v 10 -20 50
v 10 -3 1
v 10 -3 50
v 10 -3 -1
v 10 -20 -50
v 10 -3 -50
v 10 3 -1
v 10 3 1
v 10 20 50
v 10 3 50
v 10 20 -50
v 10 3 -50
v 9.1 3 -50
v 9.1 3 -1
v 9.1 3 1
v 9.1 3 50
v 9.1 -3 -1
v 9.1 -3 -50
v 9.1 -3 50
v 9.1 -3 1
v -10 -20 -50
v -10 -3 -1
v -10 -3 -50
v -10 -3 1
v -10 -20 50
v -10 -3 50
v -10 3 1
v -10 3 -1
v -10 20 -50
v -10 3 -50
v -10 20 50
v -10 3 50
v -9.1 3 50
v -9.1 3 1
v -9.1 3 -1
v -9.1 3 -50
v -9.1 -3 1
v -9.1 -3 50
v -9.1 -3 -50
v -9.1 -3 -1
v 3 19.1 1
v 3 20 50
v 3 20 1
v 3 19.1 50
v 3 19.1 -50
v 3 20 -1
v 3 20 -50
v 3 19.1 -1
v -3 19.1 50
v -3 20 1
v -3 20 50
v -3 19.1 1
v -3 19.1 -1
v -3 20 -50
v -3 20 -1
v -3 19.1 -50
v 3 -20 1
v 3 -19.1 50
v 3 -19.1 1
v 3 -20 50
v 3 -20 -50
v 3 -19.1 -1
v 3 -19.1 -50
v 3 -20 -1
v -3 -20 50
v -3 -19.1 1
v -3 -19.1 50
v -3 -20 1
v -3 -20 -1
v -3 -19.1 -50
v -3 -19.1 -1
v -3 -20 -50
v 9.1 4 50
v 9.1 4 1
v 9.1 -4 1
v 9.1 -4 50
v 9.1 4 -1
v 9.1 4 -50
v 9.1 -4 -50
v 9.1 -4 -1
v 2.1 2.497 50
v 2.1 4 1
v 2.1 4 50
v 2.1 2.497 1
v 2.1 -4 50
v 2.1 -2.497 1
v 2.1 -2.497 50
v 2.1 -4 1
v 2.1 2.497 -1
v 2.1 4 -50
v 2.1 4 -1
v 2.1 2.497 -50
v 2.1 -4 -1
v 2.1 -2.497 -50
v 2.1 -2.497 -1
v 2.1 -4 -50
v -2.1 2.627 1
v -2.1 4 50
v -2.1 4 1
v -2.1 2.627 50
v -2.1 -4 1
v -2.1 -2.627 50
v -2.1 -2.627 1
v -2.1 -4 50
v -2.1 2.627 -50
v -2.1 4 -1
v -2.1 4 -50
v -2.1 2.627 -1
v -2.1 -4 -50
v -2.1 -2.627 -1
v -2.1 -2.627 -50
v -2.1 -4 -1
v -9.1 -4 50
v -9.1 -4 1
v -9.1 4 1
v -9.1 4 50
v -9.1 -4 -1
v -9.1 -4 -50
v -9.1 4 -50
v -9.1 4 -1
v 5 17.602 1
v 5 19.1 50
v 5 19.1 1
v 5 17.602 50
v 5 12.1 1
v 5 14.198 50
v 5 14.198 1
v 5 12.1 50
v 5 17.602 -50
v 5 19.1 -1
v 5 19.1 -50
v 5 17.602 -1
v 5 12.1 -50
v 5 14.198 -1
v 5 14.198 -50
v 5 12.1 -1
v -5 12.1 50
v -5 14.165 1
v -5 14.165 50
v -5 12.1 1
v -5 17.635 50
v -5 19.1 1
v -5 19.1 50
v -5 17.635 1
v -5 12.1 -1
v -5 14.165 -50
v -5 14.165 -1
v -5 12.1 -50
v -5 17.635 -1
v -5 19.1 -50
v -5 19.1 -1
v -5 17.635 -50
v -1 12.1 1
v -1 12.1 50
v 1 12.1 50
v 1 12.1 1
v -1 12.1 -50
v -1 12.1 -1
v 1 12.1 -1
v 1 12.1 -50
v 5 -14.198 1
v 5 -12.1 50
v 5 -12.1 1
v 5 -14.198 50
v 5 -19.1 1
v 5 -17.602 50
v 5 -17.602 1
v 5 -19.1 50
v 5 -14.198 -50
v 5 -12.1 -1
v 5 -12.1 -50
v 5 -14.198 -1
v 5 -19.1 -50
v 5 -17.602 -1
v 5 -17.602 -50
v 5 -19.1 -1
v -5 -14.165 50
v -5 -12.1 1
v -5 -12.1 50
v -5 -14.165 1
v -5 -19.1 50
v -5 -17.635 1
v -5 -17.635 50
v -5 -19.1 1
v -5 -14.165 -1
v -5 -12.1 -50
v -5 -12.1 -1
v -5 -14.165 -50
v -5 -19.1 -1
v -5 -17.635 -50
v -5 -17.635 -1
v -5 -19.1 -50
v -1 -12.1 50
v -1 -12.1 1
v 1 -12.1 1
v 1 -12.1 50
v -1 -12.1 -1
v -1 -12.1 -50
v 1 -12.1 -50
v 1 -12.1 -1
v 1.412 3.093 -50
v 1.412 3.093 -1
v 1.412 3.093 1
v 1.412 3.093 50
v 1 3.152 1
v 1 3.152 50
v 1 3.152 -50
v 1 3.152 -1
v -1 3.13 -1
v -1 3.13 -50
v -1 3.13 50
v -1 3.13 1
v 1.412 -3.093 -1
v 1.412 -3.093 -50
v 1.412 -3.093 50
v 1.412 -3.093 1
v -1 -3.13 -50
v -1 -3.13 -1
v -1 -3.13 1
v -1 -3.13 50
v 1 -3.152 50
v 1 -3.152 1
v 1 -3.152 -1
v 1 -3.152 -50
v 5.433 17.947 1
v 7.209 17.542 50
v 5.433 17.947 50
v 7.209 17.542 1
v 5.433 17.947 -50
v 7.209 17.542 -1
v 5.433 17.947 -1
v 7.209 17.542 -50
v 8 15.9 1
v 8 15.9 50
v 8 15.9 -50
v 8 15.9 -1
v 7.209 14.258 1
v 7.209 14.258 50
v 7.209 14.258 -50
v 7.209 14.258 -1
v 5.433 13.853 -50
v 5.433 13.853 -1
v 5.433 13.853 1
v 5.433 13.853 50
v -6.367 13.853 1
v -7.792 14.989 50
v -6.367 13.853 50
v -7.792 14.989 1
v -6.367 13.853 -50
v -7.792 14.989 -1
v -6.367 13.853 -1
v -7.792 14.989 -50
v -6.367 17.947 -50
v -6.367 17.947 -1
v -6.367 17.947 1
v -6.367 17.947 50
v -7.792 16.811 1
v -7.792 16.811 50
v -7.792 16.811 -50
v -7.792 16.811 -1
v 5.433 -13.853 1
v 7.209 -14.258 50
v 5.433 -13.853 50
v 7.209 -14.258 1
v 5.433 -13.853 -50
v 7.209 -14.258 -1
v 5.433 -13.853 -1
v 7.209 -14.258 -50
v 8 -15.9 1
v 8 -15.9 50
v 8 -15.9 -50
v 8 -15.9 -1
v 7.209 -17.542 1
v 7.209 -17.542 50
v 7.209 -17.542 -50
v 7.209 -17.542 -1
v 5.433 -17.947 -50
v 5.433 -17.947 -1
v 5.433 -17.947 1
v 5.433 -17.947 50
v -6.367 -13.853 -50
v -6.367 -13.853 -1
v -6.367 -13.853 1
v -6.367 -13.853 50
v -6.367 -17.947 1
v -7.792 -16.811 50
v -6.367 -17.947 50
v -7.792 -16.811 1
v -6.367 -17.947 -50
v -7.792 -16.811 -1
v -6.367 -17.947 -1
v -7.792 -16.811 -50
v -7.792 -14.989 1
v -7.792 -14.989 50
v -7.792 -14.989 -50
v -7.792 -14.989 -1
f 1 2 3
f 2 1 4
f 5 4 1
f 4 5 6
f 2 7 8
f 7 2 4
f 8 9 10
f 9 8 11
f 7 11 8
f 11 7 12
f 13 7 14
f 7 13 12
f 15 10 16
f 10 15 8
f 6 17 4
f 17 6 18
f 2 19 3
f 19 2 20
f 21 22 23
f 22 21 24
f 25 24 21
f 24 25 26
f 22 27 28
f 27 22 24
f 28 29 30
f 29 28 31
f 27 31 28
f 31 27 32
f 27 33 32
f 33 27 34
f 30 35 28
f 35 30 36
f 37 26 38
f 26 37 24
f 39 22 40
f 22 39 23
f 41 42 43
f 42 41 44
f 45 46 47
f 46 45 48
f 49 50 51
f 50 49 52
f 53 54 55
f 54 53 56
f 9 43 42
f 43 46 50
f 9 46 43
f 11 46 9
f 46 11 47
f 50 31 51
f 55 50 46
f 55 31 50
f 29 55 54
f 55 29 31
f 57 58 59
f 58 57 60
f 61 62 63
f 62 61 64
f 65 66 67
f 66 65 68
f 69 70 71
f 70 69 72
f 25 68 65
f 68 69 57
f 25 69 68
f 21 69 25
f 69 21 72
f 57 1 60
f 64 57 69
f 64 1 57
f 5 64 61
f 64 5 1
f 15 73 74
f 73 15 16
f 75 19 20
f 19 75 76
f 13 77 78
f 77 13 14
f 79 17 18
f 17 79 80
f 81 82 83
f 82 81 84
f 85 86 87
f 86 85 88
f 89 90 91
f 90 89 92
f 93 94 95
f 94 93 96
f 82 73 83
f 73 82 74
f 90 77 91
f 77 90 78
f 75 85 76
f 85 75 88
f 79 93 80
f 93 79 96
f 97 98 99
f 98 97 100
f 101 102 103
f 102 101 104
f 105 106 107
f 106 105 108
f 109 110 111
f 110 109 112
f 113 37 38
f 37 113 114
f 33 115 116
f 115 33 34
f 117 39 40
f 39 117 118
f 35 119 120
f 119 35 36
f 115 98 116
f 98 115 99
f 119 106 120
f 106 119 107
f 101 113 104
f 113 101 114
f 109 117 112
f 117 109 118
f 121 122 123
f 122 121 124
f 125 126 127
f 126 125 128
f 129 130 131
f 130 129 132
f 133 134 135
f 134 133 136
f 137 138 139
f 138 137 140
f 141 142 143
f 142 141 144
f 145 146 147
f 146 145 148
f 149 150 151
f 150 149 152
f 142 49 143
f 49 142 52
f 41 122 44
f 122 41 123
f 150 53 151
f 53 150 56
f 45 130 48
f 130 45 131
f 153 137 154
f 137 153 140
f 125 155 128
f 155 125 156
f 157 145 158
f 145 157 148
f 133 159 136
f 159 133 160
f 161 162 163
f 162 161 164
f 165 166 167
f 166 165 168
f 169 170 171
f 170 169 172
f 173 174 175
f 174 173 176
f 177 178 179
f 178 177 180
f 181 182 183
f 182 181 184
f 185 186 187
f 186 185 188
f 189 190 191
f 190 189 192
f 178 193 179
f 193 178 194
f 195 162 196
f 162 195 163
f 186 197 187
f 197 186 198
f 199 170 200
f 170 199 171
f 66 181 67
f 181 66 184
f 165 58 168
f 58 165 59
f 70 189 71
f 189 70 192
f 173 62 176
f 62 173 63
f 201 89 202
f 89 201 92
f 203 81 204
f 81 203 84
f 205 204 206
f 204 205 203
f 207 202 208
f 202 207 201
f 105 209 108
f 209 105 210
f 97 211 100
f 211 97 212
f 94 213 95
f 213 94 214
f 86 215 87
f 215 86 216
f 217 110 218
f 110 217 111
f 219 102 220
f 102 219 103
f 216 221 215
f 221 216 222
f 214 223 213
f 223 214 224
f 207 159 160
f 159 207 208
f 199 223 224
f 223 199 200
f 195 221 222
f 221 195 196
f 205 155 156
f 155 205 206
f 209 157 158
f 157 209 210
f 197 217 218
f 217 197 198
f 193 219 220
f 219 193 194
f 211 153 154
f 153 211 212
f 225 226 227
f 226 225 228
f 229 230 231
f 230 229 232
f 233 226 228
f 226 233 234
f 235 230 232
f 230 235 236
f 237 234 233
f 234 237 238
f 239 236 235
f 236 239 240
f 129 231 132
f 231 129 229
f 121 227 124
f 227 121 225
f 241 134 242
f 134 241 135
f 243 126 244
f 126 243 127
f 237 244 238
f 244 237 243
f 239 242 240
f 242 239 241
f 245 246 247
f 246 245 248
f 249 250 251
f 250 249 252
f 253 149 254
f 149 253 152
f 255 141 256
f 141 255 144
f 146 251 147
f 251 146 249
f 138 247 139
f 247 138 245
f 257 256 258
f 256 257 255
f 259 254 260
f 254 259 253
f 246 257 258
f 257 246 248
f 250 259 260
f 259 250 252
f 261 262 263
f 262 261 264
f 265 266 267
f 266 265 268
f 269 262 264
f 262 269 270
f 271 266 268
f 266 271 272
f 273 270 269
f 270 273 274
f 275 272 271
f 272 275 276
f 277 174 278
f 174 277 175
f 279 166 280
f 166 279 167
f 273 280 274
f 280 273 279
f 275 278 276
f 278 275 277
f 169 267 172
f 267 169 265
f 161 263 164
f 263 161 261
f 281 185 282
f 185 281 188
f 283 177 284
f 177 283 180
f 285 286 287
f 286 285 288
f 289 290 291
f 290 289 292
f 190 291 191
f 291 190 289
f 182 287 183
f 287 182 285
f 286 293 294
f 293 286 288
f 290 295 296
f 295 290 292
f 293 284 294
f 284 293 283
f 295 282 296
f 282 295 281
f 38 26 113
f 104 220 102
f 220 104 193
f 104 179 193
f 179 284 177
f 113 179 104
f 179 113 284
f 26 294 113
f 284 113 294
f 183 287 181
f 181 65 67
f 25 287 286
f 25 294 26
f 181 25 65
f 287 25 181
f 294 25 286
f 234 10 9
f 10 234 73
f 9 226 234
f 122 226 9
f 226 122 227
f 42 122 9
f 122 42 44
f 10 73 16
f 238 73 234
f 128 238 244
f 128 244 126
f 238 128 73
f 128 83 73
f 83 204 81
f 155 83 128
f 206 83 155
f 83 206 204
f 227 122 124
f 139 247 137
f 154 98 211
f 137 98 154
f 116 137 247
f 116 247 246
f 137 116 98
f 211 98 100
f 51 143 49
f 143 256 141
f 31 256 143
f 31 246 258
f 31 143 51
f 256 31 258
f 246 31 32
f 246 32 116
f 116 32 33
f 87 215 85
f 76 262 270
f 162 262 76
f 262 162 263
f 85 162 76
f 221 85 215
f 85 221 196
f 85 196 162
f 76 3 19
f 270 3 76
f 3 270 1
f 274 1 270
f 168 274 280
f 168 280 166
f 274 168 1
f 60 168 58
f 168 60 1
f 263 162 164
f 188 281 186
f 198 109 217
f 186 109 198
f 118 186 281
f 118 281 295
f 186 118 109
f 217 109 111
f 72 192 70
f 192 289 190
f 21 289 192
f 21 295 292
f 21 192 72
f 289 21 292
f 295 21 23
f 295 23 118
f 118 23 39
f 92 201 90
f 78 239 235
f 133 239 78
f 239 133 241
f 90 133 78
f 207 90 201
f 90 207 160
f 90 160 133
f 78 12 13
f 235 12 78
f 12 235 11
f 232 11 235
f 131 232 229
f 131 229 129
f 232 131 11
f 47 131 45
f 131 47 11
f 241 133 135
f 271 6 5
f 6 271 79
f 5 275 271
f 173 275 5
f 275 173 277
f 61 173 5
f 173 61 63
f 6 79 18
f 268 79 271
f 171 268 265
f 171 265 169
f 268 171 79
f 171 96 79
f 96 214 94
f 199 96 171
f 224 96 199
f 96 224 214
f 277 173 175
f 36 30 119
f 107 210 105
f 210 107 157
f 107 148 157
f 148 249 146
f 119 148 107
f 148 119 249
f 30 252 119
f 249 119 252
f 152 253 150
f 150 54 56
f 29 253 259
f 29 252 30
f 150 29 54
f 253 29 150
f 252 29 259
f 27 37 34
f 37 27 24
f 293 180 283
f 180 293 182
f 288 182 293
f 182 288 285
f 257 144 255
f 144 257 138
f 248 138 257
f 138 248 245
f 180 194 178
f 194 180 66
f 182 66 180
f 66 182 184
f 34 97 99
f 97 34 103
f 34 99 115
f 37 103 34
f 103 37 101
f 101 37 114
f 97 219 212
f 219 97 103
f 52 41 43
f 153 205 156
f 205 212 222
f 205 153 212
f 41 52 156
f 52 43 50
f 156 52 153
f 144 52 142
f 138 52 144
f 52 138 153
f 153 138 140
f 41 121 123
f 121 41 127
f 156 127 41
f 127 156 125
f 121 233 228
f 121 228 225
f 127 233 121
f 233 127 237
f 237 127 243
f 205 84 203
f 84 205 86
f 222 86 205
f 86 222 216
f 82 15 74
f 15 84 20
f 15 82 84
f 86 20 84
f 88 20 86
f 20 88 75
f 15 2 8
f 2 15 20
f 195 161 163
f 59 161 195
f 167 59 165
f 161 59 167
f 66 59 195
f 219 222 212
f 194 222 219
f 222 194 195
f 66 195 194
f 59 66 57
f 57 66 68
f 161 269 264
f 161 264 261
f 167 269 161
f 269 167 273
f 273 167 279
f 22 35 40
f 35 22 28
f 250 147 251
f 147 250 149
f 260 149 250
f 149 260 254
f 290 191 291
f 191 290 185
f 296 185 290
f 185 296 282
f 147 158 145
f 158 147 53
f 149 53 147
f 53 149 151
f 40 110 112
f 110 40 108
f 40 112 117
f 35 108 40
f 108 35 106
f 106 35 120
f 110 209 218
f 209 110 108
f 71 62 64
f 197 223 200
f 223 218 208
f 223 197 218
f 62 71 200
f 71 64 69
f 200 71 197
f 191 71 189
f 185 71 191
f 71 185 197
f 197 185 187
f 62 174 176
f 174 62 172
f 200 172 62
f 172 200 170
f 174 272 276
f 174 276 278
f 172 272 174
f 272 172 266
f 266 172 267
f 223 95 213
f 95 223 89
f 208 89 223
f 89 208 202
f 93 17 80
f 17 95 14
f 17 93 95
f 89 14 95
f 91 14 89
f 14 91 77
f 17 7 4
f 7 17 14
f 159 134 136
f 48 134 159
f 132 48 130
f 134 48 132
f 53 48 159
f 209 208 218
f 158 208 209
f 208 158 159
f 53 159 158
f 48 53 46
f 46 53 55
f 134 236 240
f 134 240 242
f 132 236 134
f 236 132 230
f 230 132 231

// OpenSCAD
// Parameters
profile_width_mm = 20.0; //[10.0:40.0:0.5]
profile_height_mm = 40.0; //[20.0:80.0:0.5]
length_mm = 100.0; //[50.0:200.0:1]
center = 1; //[0:1:1]
cornerHole = 1; //[0:1:1]
wall_thickness_mm = 2.0; //[1.0:4.0:0.25]
slot_opening_mm = 6.0; //[4.0:10.0:0.25]
slot_depth_mm = 6.0; //[3.0:10.0:0.25]
slot_cavity_width_mm = 10.0; //[6.0:16.0:0.25]
slot_cavity_height_mm = 8.0; //[5.0:14.0:0.25]
web_thickness_mm = 2.0; //[1.0:4.0:0.25]
center_bore_d_mm = 6.8; //[4.0:12.0:0.1]
corner_hole_d_mm = 4.2; //[2.5:8.0:0.1]
overlap_mm = 1.0; //[0.5:2.0:0.1]

// Extrusion - complete detailed geometry
module extrusion() {
  color("Silver") {
    difference() {
      // Main profile body
      cube([profile_width_mm, profile_height_mm, length_mm], center=true);
      
      // T-slot channels and cavities
      union() {
        translate([profile_width_mm/2 - (slot_depth_mm + overlap_mm)/2, 0, 0])
          cube([slot_depth_mm + overlap_mm, slot_opening_mm, length_mm + 2*overlap_mm], center=true);
        translate([-profile_width_mm/2 + (slot_depth_mm + overlap_mm)/2, 0, 0])
          cube([slot_depth_mm + overlap_mm, slot_opening_mm, length_mm + 2*overlap_mm], center=true);
        translate([0, profile_height_mm/2 - (slot_depth_mm + overlap_mm)/2, 0])
          cube([slot_opening_mm, slot_depth_mm + overlap_mm, length_mm + 2*overlap_mm], center=true);
        translate([0, -profile_height_mm/2 + (slot_depth_mm + overlap_mm)/2, 0])
          cube([slot_opening_mm, slot_depth_mm + overlap_mm, length_mm + 2*overlap_mm], center=true);
        translate([profile_width_mm/2 - (slot_depth_mm + overlap_mm)/2 - (slot_depth_mm*0.15), 0, 0])
          cube([slot_depth_mm + overlap_mm, slot_cavity_height_mm, length_mm + 2*overlap_mm], center=true);
        translate([-profile_width_mm/2 + (slot_depth_mm + overlap_mm)/2 + (slot_depth_mm*0.15), 0, 0])
          cube([slot_depth_mm + overlap_mm, slot_cavity_height_mm, length_mm + 2*overlap_mm], center=true);
        translate([0, profile_height_mm/2 - (slot_depth_mm + overlap_mm)/2 - (slot_depth_mm*0.15), 0])
          cube([slot_cavity_width_mm, slot_depth_mm + overlap_mm, length_mm + 2*overlap_mm], center=true);
        translate([0, -profile_height_mm/2 + (slot_depth_mm + overlap_mm)/2 + (slot_depth_mm*0.15), 0])
          cube([slot_cavity_width_mm, slot_depth_mm + overlap_mm, length_mm + 2*overlap_mm], center=true);
      }
      
      // Center bore and internal webs
      union() {
        cylinder(r=center_bore_d_mm/2, h=length_mm + 2*overlap_mm, center=true);
        cube([profile_width_mm - 2*wall_thickness_mm, web_thickness_mm, length_mm + 2*overlap_mm], center=true);
        cube([web_thickness_mm, profile_height_mm - 2*wall_thickness_mm, length_mm + 2*overlap_mm], center=true);
      }
      
      // Corner holes
      if (cornerHole) {
        union() {
          translate([profile_width_mm/2 - wall_thickness_mm - corner_hole_d_mm/2, profile_height_mm/2 - wall_thickness_mm - corner_hole_d_mm/2, 0])
            cylinder(r=corner_hole_d_mm/2, h=length_mm + 2*overlap_mm, center=true);
          translate([-profile_width_mm/2 + wall_thickness_mm + corner_hole_d_mm/2, profile_height_mm/2 - wall_thickness_mm - corner_hole_d_mm/2, 0])
            cylinder(r=corner_hole_d_mm/2, h=length_mm + 2*overlap_mm, center=true);
          translate([profile_width_mm/2 - wall_thickness_mm - corner_hole_d_mm/2, -profile_height_mm/2 + wall_thickness_mm + corner_hole_d_mm/2, 0])
            cylinder(r=corner_hole_d_mm/2, h=length_mm + 2*overlap_mm, center=true);
          translate([-profile_width_mm/2 + wall_thickness_mm + corner_hole_d_mm/2, -profile_height_mm/2 + wall_thickness_mm + corner_hole_d_mm/2, 0])
            cylinder(r=corner_hole_d_mm/2, h=length_mm + 2*overlap_mm, center=true);
        }
      }
    }
  }
}

// Extrusion Cross Section - complete detailed geometry
module extrusion_cross_section() {
  color("DimGray") {
    cube([profile_width_mm, profile_height_mm, web_thickness_mm], center=true);
  }
}

// Box Corner Profile Section - complete detailed geometry
module box_corner_profile_section() {
  color("Black") {
    translate([profile_width_mm/2 - wall_thickness_mm/2, profile_height_mm/2 - wall_thickness_mm/2, 0])
      cube([wall_thickness_mm, wall_thickness_mm, length_mm], center=true);
  }
}

// Box Corner Profile Sections - complete detailed geometry
module box_corner_profile_sections() {
  color("Black") {
    translate([-profile_width_mm/2 + wall_thickness_mm/2, -profile_height_mm/2 + wall_thickness_mm/2, 0])
      cube([wall_thickness_mm, wall_thickness_mm, length_mm], center=true);
  }
}

// Assembly
module assembly() {
  extrusion();
  extrusion_cross_section();
  box_corner_profile_section();
  box_corner_profile_sections();
}

assembly();
